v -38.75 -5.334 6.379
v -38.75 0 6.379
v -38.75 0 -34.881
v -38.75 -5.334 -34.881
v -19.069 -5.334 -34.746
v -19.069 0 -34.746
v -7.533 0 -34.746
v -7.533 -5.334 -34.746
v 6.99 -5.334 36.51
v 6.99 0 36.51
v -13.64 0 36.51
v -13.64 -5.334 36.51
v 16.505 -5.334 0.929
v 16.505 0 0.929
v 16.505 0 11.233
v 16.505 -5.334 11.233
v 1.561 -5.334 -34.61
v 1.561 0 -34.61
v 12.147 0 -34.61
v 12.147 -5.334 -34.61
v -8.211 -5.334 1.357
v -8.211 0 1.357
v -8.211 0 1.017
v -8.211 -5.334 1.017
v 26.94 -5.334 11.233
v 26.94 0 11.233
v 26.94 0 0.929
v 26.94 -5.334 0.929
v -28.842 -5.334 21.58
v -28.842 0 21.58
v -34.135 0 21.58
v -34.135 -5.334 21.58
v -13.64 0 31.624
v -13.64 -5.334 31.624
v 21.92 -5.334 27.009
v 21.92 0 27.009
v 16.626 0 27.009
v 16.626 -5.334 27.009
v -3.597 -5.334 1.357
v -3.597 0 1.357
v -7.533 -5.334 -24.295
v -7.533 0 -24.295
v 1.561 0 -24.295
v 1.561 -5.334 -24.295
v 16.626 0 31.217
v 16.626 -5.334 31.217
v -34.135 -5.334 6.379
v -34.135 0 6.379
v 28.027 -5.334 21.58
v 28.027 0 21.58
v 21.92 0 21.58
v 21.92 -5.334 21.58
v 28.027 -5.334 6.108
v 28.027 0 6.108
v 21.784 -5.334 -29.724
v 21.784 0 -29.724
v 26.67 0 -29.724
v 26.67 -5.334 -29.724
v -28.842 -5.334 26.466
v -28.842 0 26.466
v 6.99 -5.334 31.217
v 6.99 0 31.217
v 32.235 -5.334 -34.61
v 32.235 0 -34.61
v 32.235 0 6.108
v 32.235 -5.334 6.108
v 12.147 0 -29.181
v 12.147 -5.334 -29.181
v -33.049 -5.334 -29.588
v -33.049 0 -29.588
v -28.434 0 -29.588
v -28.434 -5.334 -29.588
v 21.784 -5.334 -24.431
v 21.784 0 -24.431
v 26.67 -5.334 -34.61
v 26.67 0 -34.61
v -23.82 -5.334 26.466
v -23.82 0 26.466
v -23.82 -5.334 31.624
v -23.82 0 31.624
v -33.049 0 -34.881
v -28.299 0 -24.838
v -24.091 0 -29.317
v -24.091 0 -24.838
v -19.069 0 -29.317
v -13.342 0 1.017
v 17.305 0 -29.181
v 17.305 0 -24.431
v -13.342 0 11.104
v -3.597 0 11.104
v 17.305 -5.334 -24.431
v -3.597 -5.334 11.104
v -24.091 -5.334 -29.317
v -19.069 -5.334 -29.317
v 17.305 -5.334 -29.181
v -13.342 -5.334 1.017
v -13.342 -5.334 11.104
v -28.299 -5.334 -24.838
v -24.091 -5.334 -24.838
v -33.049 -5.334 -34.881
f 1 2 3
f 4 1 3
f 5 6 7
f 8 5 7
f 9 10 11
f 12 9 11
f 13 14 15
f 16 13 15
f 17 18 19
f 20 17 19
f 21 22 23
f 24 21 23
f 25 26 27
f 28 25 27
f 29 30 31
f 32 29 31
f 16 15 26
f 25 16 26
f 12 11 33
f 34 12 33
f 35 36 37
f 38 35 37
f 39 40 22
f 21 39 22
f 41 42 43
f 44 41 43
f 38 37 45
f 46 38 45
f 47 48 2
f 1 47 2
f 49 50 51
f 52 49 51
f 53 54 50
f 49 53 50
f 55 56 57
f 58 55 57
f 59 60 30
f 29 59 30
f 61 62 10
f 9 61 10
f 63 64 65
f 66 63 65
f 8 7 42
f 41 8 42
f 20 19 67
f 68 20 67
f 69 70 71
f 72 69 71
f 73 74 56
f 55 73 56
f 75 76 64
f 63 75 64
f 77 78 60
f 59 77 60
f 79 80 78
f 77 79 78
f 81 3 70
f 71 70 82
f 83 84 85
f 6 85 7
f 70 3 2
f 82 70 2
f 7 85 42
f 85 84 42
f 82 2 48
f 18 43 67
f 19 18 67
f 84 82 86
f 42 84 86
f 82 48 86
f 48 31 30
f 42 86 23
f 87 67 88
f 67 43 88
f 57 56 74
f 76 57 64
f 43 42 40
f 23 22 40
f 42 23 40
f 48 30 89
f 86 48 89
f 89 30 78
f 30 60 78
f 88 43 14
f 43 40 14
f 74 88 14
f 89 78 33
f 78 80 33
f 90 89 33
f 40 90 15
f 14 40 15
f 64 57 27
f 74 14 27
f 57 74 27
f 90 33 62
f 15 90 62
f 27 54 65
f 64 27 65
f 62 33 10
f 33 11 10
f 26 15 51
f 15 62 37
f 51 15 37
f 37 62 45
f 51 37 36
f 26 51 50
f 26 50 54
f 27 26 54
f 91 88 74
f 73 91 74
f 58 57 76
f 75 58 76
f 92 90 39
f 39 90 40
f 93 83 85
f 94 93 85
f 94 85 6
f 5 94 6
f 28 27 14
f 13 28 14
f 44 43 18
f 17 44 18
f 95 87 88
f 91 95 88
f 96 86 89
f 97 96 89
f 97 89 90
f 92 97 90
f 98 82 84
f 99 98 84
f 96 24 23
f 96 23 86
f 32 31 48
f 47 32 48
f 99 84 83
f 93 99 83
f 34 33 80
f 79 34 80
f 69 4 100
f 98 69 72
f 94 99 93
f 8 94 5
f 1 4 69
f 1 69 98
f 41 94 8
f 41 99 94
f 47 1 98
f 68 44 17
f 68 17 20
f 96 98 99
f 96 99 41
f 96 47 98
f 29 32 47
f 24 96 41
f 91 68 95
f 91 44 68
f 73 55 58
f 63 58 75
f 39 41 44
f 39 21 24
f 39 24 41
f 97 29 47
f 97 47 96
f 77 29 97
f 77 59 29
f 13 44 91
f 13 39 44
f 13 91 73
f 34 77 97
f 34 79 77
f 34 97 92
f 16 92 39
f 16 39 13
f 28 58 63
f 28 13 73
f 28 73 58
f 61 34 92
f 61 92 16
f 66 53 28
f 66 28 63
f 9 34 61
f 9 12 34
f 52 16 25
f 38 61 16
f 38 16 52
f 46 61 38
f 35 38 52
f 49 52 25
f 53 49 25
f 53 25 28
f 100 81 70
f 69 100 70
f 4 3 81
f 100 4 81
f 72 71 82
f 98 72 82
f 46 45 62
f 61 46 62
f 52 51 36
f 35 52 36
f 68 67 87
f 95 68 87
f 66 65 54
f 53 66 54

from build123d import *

# Parameters (mm, degrees)
F1_DEPTH = 5.334


with BuildPart() as f1:
    # F0 (on Front) → F1 (new body)
    with BuildSketch(Plane.XZ):
        Polygon((-28.434427, -29.588092), (-28.298704, -24.837712), (-24.091221, -24.837712), (-24.091221, -29.316641), (-19.06939, -29.316641), (-19.06939, -34.745649), (-7.532748, -34.745649), (-7.532748, -24.29481), (1.560839, -24.29481), (1.560839, -34.609925), (12.147406, -34.609925), (12.147406, -29.180918), (17.304963, -29.180918), (17.304963, -24.430534), (21.783892, -24.430534), (21.783892, -29.723817), (26.67, -29.723817), (26.67, -34.609925), (32.234732, -34.609925), (32.234732, 6.107633), (28.027251, 6.107633), (28.027251, 21.580307), (21.919617, 21.580307), (21.919617, 27.009314), (16.626336, 27.009314), (16.626336, 31.216795), (6.989847, 31.216795), (6.989847, 36.510076), (-13.640381, 36.510076), (-13.640381, 31.623971), (-23.819771, 31.623971), (-23.819771, 26.466411), (-28.841604, 26.466411), (-28.841604, 21.580307), (-34.134887, 21.580307), (-34.134887, 6.379084), (-38.749542, 6.379084), (-38.749542, -34.881376), (-33.049084, -34.881376), (-33.049084, -29.588092), align=None)
        Polygon((-18.79794, 21.580307), (-18.119313, 21.580307), (-7.939924, 21.580307), (-7.939924, 16.558474), (-3.596718, 16.558474), (-3.596718, 11.104424), (-3.596718, 1.357252), (-8.211374, 1.357252), (-8.211374, 1.016588), (-8.211374, -3.66458), (-18.526489, -3.66458), (-18.526489, 1.357252), (-23.819771, 1.357252), (-23.819771, 16.151298), (-18.79794, 16.151298), align=None, mode=Mode.SUBTRACT)
        Polygon((6.521792, 1.090871), (6.521792, 15.899813), (6.521792, 16.182272), (11.606061, 16.182272), (11.606061, 21.266542), (21.976355, 21.266542), (21.976355, 16.222624), (26.939571, 16.222624), (26.939571, 11.232948), (26.939571, 0.929466), (22.016706, 0.929466), (22.016706, -4.195155), (11.525358, -4.195155), (11.525358, 1.090871), align=None, mode=Mode.SUBTRACT)
        Polygon((-7.939924, 21.580307), (-18.119313, 21.580307), (-18.79794, 21.580307), (-18.79794, 16.151298), (-23.819771, 16.151298), (-23.819771, 1.357252), (-18.526489, 1.357252), (-18.526489, -3.66458), (-8.211374, -3.66458), (-8.211374, 1.016588), (-13.341749, 1.016588), (-13.341749, 11.104424), (-3.596718, 11.104424), (-3.596718, 16.558474), (-7.939924, 16.558474), align=None)
        Polygon((6.521792, 16.182272), (6.521792, 15.899813), (6.521792, 1.090871), (11.525358, 1.090871), (11.525358, -4.195155), (22.016706, -4.195155), (22.016706, 0.929466), (16.504878, 0.929466), (16.504878, 11.232948), (26.939571, 11.232948), (26.939571, 16.222624), (21.976355, 16.222624), (21.976355, 21.266542), (11.606061, 21.266542), (11.606061, 16.182272), align=None)
    extrude(amount=F1_DEPTH)


solid = f1.part
